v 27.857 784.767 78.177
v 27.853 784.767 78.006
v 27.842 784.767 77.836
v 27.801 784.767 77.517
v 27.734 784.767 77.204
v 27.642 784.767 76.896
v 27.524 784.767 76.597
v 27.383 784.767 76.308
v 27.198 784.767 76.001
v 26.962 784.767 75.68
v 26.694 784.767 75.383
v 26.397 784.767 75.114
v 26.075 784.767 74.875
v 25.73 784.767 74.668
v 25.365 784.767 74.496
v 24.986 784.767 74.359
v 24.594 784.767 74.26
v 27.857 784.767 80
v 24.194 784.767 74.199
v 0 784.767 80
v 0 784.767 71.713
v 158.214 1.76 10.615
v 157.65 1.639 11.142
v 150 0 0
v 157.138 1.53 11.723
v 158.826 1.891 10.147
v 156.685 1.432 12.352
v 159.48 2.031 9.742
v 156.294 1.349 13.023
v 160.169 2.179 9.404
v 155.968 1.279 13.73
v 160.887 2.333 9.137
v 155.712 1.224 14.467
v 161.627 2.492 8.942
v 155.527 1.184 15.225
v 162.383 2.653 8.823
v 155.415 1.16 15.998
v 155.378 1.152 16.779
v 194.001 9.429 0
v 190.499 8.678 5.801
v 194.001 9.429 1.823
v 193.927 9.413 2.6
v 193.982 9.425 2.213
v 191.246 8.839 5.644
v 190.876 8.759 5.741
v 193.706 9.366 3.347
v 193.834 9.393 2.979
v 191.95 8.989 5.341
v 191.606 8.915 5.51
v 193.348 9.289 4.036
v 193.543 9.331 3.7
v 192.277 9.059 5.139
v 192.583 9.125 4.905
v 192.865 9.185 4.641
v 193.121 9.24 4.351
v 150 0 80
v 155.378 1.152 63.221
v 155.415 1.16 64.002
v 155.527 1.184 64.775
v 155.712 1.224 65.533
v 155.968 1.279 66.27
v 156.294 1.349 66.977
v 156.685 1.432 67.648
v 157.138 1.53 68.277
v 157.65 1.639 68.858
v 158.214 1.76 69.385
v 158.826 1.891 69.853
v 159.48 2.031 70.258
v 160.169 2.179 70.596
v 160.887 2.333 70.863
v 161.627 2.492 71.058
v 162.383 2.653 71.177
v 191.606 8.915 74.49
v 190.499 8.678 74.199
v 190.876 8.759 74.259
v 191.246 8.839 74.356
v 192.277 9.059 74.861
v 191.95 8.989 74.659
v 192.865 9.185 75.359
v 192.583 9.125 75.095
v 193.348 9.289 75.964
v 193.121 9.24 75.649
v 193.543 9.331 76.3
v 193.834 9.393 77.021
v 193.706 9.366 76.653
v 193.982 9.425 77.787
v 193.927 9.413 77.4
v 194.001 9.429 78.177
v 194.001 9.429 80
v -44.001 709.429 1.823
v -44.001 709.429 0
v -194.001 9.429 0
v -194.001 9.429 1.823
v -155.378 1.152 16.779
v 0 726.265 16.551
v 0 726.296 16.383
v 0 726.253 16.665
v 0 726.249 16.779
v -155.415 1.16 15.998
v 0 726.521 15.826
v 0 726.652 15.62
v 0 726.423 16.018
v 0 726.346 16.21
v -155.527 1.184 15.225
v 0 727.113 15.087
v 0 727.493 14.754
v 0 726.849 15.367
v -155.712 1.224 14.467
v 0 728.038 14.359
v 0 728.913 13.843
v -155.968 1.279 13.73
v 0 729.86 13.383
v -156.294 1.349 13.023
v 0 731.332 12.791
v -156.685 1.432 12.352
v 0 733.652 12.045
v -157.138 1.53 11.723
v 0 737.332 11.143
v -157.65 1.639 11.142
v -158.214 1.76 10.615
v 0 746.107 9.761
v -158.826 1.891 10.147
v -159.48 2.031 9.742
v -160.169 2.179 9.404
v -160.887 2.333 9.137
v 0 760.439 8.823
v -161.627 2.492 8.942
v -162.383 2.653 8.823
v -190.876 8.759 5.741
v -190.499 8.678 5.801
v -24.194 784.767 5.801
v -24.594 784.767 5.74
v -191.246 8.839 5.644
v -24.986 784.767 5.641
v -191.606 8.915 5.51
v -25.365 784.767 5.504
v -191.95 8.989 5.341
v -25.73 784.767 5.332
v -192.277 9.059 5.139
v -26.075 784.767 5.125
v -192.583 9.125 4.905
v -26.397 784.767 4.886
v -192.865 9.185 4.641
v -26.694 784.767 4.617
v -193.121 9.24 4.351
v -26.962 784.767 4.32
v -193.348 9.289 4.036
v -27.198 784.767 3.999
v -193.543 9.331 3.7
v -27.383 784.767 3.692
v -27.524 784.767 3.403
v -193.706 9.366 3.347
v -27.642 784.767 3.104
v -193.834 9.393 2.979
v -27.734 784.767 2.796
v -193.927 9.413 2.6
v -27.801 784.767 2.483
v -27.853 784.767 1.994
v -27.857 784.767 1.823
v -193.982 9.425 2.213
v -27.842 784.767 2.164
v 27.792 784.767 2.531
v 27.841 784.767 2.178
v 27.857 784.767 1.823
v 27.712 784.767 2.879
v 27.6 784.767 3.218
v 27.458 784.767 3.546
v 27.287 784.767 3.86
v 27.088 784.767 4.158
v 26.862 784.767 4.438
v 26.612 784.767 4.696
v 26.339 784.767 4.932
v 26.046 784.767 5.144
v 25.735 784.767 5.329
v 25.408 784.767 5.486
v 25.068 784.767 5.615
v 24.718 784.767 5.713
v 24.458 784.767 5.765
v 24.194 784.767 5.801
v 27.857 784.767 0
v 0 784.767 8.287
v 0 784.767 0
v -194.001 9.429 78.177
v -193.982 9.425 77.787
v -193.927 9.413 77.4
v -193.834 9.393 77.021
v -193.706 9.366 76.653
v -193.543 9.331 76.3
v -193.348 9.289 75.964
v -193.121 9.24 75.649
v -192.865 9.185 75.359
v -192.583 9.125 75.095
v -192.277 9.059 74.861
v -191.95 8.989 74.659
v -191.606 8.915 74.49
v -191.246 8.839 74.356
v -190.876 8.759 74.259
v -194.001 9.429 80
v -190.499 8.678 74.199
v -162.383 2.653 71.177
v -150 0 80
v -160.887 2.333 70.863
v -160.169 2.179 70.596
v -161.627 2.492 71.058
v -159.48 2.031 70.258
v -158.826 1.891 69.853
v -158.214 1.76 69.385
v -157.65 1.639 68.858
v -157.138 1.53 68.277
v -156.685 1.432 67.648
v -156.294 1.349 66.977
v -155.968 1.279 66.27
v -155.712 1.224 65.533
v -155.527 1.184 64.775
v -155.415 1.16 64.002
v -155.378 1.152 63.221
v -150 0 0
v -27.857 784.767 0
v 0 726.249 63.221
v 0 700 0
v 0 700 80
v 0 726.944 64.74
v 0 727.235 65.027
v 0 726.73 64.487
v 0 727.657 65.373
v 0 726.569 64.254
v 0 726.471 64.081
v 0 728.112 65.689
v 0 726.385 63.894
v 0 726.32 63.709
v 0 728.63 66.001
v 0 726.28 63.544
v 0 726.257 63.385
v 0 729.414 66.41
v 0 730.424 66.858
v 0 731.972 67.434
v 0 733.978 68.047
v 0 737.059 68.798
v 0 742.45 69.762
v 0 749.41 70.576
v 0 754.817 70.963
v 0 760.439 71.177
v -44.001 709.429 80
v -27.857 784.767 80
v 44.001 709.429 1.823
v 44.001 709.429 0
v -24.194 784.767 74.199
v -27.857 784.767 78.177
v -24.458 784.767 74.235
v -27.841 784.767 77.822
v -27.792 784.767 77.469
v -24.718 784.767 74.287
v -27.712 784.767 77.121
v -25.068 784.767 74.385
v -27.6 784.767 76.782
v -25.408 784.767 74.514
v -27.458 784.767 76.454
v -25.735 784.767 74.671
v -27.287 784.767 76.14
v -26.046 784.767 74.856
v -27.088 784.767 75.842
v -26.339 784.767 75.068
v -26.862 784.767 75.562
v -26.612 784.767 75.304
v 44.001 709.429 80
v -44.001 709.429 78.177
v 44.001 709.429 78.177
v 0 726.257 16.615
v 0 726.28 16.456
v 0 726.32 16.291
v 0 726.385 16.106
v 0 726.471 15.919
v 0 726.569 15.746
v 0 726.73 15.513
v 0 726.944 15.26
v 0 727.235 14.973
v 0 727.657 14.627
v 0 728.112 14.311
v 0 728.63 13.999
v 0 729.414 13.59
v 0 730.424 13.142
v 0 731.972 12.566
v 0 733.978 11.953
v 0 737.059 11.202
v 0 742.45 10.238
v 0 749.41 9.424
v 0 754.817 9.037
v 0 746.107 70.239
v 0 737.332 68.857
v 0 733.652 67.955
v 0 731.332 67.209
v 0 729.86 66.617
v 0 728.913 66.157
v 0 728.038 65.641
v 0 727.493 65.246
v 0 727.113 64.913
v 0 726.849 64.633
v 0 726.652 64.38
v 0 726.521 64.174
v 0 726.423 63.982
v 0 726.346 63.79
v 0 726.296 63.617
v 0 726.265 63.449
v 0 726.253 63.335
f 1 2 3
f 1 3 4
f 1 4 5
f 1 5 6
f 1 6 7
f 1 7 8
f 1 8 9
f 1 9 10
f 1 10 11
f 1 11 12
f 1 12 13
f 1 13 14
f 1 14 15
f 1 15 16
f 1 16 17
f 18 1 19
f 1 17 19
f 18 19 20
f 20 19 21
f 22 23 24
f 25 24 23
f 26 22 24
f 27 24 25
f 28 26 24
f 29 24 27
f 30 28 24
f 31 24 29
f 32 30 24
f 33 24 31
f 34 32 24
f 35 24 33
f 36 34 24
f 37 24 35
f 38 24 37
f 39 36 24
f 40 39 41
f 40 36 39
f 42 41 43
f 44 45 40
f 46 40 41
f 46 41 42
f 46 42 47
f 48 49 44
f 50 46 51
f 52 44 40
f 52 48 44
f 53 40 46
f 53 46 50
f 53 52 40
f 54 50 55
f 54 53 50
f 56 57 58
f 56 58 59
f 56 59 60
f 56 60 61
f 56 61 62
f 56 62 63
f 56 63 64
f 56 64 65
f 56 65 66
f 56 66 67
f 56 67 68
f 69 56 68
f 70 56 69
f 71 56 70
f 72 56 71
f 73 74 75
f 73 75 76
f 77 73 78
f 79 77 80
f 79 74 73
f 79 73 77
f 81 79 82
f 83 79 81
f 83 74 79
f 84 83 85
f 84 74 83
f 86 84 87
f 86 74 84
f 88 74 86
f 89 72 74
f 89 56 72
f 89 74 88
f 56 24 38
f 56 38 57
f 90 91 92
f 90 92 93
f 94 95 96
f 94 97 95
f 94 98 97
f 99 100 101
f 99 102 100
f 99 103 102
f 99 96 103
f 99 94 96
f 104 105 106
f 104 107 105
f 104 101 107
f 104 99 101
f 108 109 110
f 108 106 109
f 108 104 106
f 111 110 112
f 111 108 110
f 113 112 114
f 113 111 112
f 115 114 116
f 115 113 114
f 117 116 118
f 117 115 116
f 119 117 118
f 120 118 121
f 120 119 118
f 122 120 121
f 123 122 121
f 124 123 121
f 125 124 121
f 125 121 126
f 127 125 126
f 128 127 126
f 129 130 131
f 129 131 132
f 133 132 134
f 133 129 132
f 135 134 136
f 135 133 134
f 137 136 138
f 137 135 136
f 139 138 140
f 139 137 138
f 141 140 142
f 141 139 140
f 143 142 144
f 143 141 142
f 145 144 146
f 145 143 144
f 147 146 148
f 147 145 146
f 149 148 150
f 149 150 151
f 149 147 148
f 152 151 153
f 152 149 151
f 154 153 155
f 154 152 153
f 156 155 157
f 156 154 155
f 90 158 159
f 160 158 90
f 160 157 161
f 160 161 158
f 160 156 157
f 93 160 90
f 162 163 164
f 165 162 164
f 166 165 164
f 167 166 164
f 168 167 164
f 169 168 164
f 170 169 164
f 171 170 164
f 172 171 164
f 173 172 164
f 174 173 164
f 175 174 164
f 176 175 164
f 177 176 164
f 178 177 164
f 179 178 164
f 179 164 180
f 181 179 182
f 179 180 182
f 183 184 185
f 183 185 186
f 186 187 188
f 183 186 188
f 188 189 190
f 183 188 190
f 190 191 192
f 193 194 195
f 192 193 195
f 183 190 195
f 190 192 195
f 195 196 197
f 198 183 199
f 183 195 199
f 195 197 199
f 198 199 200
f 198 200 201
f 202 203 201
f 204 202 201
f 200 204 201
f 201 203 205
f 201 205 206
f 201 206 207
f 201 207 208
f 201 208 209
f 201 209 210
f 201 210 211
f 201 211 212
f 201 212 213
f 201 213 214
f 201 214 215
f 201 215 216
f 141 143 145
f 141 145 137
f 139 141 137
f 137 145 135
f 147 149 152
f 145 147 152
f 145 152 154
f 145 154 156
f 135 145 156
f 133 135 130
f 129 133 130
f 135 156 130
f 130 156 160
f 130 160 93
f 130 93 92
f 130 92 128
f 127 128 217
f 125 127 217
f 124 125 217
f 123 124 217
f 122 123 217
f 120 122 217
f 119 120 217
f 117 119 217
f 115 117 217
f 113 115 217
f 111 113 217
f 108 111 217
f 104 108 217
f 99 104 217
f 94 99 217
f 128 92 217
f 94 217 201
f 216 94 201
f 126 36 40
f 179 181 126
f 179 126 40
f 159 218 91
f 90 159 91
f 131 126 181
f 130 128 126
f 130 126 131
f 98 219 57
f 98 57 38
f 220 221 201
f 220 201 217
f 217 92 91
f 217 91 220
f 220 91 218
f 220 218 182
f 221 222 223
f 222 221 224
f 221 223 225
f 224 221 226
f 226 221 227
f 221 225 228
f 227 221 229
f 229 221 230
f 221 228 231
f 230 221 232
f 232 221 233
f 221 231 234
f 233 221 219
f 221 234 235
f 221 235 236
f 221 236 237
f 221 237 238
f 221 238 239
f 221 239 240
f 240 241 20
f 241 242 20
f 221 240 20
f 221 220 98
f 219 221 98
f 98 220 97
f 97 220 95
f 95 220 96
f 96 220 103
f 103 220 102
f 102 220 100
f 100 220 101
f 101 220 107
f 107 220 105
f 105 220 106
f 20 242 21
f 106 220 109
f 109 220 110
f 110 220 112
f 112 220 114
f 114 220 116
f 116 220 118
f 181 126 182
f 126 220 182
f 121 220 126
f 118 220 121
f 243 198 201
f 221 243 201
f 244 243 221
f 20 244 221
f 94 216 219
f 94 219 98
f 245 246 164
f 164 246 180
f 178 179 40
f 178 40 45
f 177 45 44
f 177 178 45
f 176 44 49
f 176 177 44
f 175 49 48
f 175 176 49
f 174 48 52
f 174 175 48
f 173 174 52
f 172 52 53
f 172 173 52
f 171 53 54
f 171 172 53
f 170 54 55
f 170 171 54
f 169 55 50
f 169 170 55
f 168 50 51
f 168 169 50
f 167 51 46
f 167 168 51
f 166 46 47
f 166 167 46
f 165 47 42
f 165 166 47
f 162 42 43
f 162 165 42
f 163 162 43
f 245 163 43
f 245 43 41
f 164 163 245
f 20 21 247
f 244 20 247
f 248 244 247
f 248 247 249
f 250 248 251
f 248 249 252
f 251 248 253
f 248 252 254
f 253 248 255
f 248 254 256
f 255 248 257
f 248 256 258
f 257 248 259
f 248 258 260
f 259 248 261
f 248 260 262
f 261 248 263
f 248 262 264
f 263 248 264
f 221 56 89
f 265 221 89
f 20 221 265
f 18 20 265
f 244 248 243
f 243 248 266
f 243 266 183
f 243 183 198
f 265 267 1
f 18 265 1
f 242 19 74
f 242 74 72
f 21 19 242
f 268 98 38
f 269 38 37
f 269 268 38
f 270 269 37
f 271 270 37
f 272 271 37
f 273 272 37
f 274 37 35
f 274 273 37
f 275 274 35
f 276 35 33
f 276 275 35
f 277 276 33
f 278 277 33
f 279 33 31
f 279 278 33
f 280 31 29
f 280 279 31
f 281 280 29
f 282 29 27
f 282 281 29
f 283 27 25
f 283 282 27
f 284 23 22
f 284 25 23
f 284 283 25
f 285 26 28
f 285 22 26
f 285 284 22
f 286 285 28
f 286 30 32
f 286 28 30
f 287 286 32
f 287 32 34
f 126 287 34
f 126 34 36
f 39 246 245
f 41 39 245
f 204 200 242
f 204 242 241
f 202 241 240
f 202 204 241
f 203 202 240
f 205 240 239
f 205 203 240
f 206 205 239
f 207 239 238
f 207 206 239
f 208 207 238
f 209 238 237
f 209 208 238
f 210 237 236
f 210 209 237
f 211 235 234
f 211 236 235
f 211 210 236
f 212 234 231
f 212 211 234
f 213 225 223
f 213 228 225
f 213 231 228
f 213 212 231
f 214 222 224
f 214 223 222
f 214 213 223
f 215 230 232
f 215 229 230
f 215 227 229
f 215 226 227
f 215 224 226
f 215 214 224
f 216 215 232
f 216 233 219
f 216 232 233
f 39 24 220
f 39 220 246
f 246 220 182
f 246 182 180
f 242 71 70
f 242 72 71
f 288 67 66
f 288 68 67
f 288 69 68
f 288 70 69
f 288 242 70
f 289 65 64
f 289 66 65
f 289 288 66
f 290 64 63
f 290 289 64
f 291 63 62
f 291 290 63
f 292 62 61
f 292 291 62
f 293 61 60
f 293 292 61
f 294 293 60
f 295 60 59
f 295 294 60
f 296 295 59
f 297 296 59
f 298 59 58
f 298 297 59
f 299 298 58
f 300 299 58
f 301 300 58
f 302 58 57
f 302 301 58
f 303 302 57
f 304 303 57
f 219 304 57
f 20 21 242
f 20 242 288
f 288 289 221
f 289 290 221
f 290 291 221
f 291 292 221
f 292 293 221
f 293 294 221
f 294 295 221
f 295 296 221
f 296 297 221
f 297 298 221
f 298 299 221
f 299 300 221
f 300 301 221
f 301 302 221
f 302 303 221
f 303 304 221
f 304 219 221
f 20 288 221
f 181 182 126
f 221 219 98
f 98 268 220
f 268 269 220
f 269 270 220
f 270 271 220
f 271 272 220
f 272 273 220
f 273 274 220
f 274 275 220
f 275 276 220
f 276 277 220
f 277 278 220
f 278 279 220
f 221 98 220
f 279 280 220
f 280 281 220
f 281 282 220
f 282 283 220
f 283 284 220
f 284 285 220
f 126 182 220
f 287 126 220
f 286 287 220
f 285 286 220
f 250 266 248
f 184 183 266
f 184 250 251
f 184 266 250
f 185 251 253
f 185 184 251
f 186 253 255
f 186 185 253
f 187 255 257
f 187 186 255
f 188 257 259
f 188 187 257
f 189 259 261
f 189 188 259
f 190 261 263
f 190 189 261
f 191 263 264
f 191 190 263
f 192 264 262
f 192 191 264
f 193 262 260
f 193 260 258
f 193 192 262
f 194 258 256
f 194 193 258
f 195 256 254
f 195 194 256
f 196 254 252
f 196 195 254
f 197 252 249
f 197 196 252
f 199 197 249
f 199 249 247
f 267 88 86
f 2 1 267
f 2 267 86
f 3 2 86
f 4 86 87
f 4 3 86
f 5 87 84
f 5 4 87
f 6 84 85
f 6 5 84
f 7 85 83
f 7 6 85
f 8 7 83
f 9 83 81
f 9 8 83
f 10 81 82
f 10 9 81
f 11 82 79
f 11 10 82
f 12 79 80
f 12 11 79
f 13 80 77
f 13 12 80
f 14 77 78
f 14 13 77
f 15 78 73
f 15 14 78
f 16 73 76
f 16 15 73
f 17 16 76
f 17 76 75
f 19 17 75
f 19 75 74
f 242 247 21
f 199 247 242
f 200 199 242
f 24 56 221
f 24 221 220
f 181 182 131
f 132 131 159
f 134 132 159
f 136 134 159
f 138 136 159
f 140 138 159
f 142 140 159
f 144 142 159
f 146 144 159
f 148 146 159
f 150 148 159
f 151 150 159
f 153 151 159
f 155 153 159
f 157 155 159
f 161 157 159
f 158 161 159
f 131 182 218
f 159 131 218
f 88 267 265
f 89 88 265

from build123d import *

# Parameters (mm, degrees)
C_START                               = -31.42936331
C_CHANNEL_CONFIGURED_80_X_8_1_DEPTH   = 715.891053164
C_CHANNEL_CONFIGURED_80_X_8_1_2_DEPTH = 80
C_START_2                             = 684.461689854
C_CHANNEL_CONFIGURED_80_X_8_1_3_DEPTH = 210.538310146
C_START_3                             = -684.461689854
C_CHANNEL_CONFIGURED_80_X_8_1_4_DEPTH = 715.891053164
C_CHANNEL_CONFIGURED_80_X_8_1_5_DEPTH = 80
C_START_4                             = -895
C_CHANNEL_CONFIGURED_80_X_8_1_6_DEPTH = 210.538310146
SKETCH12_W                            = 228.035854542
SKETCH12_H                            = 149.852132985
CUT_EXTRUDE1_DEPTH                    = 939.528461201


with BuildPart() as part:
    # C channel - configured 80 X 8(1): read off the stored shape, not the designer's step
    # C channel - configured 80 X 8(1) outline → C channel - configured 80 X 8(1) (new body)
    with BuildSketch(Plane(origin=(0, 0, 0), x_dir=(0.9778024140774096, -0.20952908873087298, 0), z_dir=(0.20952908873087295, 0.9778024140774098, 0)).offset(C_START)):
        with BuildLine():
            ThreePointArc((-188.088475965, -74.199337243), (-190.642941414, -75.500902399), (-191.670362112, -78.177424825))
            Line((-191.670362112, -78.177424825), (-191.670362112, -80))
            Line((-191.670362112, -80), (-146.670362112, -80))
            Line((-146.670362112, -80), (-146.670362112, 0))
            Line((-146.670362112, 0), (-191.670362112, 0))
            Line((-191.670362112, 0), (-191.670362112, -1.822575175))
            ThreePointArc((-191.670362112, -1.822575175), (-190.642941414, -4.499097601), (-188.088475965, -5.800662757))
            Line((-188.088475965, -5.800662757), (-159.334134405, -8.822865837))
            ThreePointArc((-159.334134405, -8.822865837), (-154.225203508, -11.425996149), (-152.170362112, -16.779041))
            Line((-152.170362112, -16.779041), (-152.170362112, -63.220959))
            ThreePointArc((-152.170362112, -63.220959), (-154.225203508, -68.574003851), (-159.334134405, -71.177134163))
            Line((-159.334134405, -71.177134163), (-188.088475965, -74.199337243))
        make_face()
    extrude(amount=C_CHANNEL_CONFIGURED_80_X_8_1_DEPTH)

    # C channel - configured 80 X 8_1 2 outlin → C channel - configured 80 X 8_1 2 (add)
    with BuildSketch(Plane.XY):
        Polygon((0, 914.767315949), (-44.001108633, 709.428808993), (0, 700), align=None)
    extrude(amount=C_CHANNEL_CONFIGURED_80_X_8_1_2_DEPTH)

    # C channel - configured 80 X 8_1 3 outlin → C channel - configured 80 X 8_1 3 (cut)
    with BuildSketch(Plane(origin=(0, 0, 0), x_dir=(0.9778024140774096, -0.20952908873087298, 0), z_dir=(0.20952908873087295, 0.9778024140774098, 0)).offset(C_START_2)):
        with BuildLine():
            Line((-191.670362112, -1.822575175), (-191.670362112, -78.177424825))
            ThreePointArc((-191.670362112, -78.177424825), (-190.642941414, -75.500902399), (-188.088475965, -74.199337243))
            Line((-188.088475965, -74.199337243), (-159.334134405, -71.177134163))
            ThreePointArc((-159.334134405, -71.177134163), (-154.225203508, -68.574003851), (-152.170362112, -63.220959))
            Line((-152.170362112, -63.220959), (-152.170362112, -16.779041))
            ThreePointArc((-152.170362112, -16.779041), (-154.225203508, -11.425996149), (-159.334134405, -8.822865837))
            Line((-159.334134405, -8.822865837), (-188.088475965, -5.800662757))
            ThreePointArc((-188.088475965, -5.800662757), (-190.642941414, -4.499097601), (-191.670362112, -1.822575175))
        make_face()
    extrude(amount=C_CHANNEL_CONFIGURED_80_X_8_1_3_DEPTH, mode=Mode.SUBTRACT)


with BuildPart() as body_2:
    # C channel - configured 80 X 8_1 4 outlin → C channel - configured 80 X 8_1 4 (new body)
    with BuildSketch(Plane(origin=(0, 0, 0), x_dir=(0.9778024140774096, 0.20952908873087298, 0), z_dir=(0.20952908873087295, -0.9778024140774098, 0)).offset(C_START_3)):
        with BuildLine():
            ThreePointArc((188.088475965, 74.199337243), (190.642941414, 75.500902399), (191.670362112, 78.177424825))
            Line((191.670362112, 78.177424825), (191.670362112, 80))
            Line((191.670362112, 80), (146.670362112, 80))
            Line((146.670362112, 80), (146.670362112, 0))
            Line((146.670362112, 0), (191.670362112, 0))
            Line((191.670362112, 0), (191.670362112, 1.822575175))
            ThreePointArc((191.670362112, 1.822575175), (190.642941414, 4.499097601), (188.088475965, 5.800662757))
            Line((188.088475965, 5.800662757), (159.334134405, 8.822865837))
            ThreePointArc((159.334134405, 8.822865837), (154.225203508, 11.425996149), (152.170362112, 16.779041))
            Line((152.170362112, 16.779041), (152.170362112, 63.220959))
            ThreePointArc((152.170362112, 63.220959), (154.225203508, 68.574003851), (159.334134405, 71.177134163))
            Line((159.334134405, 71.177134163), (188.088475965, 74.199337243))
        make_face()
    extrude(amount=C_CHANNEL_CONFIGURED_80_X_8_1_4_DEPTH)

    # C channel - configured 80 X 8_1 5 outlin → C channel - configured 80 X 8_1 5 (add)
    with BuildSketch(Plane.XY):
        Polygon((44.001108633, 709.428808993), (0, 914.767315949), (0, 700), align=None)
    extrude(amount=C_CHANNEL_CONFIGURED_80_X_8_1_5_DEPTH)

    # C channel - configured 80 X 8_1 6 outlin → C channel - configured 80 X 8_1 6 (cut)
    with BuildSketch(Plane(origin=(0, 0, 0), x_dir=(0.9778024140774096, 0.20952908873087298, 0), z_dir=(0.20952908873087295, -0.9778024140774098, 0)).offset(C_START_4)):
        with BuildLine():
            Line((191.670362112, 1.822575175), (191.670362112, 78.177424825))
            ThreePointArc((191.670362112, 78.177424825), (190.642941414, 75.500902399), (188.088475965, 74.199337243))
            Line((188.088475965, 74.199337243), (159.334134405, 71.177134163))
            ThreePointArc((159.334134405, 71.177134163), (154.225203508, 68.574003851), (152.170362112, 63.220959))
            Line((152.170362112, 63.220959), (152.170362112, 16.779041))
            ThreePointArc((152.170362112, 16.779041), (154.225203508, 11.425996149), (159.334134405, 8.822865837))
            Line((159.334134405, 8.822865837), (188.088475965, 5.800662757))
            ThreePointArc((188.088475965, 5.800662757), (190.642941414, 4.499097601), (191.670362112, 1.822575175))
        make_face()
    extrude(amount=C_CHANNEL_CONFIGURED_80_X_8_1_6_DEPTH, mode=Mode.SUBTRACT)


with BuildPart() as cut_extrude1_tool:
    # Sketch12 → Cut-Extrude1 (new, through all)
    with BuildSketch(Plane(origin=(0, 0, 0), x_dir=(-1, 0, 0), z_dir=(0, 0, -1))):
        with Locations((-7.945995122, 859.693382442)):
            Rectangle(SKETCH12_W, SKETCH12_H)
    extrude(amount=-CUT_EXTRUDE1_DEPTH)


with BuildPart() as part_1:
    add(part.part)

    # Cut-Extrude1: cut by cut_extrude1_tool
    add(cut_extrude1_tool.part, mode=Mode.SUBTRACT)


with BuildPart() as body_2_1:
    add(body_2.part)

    # Cut-Extrude1: cut by cut_extrude1_tool
    add(cut_extrude1_tool.part, mode=Mode.SUBTRACT)


solid = Compound([part_1.part, body_2_1.part])
